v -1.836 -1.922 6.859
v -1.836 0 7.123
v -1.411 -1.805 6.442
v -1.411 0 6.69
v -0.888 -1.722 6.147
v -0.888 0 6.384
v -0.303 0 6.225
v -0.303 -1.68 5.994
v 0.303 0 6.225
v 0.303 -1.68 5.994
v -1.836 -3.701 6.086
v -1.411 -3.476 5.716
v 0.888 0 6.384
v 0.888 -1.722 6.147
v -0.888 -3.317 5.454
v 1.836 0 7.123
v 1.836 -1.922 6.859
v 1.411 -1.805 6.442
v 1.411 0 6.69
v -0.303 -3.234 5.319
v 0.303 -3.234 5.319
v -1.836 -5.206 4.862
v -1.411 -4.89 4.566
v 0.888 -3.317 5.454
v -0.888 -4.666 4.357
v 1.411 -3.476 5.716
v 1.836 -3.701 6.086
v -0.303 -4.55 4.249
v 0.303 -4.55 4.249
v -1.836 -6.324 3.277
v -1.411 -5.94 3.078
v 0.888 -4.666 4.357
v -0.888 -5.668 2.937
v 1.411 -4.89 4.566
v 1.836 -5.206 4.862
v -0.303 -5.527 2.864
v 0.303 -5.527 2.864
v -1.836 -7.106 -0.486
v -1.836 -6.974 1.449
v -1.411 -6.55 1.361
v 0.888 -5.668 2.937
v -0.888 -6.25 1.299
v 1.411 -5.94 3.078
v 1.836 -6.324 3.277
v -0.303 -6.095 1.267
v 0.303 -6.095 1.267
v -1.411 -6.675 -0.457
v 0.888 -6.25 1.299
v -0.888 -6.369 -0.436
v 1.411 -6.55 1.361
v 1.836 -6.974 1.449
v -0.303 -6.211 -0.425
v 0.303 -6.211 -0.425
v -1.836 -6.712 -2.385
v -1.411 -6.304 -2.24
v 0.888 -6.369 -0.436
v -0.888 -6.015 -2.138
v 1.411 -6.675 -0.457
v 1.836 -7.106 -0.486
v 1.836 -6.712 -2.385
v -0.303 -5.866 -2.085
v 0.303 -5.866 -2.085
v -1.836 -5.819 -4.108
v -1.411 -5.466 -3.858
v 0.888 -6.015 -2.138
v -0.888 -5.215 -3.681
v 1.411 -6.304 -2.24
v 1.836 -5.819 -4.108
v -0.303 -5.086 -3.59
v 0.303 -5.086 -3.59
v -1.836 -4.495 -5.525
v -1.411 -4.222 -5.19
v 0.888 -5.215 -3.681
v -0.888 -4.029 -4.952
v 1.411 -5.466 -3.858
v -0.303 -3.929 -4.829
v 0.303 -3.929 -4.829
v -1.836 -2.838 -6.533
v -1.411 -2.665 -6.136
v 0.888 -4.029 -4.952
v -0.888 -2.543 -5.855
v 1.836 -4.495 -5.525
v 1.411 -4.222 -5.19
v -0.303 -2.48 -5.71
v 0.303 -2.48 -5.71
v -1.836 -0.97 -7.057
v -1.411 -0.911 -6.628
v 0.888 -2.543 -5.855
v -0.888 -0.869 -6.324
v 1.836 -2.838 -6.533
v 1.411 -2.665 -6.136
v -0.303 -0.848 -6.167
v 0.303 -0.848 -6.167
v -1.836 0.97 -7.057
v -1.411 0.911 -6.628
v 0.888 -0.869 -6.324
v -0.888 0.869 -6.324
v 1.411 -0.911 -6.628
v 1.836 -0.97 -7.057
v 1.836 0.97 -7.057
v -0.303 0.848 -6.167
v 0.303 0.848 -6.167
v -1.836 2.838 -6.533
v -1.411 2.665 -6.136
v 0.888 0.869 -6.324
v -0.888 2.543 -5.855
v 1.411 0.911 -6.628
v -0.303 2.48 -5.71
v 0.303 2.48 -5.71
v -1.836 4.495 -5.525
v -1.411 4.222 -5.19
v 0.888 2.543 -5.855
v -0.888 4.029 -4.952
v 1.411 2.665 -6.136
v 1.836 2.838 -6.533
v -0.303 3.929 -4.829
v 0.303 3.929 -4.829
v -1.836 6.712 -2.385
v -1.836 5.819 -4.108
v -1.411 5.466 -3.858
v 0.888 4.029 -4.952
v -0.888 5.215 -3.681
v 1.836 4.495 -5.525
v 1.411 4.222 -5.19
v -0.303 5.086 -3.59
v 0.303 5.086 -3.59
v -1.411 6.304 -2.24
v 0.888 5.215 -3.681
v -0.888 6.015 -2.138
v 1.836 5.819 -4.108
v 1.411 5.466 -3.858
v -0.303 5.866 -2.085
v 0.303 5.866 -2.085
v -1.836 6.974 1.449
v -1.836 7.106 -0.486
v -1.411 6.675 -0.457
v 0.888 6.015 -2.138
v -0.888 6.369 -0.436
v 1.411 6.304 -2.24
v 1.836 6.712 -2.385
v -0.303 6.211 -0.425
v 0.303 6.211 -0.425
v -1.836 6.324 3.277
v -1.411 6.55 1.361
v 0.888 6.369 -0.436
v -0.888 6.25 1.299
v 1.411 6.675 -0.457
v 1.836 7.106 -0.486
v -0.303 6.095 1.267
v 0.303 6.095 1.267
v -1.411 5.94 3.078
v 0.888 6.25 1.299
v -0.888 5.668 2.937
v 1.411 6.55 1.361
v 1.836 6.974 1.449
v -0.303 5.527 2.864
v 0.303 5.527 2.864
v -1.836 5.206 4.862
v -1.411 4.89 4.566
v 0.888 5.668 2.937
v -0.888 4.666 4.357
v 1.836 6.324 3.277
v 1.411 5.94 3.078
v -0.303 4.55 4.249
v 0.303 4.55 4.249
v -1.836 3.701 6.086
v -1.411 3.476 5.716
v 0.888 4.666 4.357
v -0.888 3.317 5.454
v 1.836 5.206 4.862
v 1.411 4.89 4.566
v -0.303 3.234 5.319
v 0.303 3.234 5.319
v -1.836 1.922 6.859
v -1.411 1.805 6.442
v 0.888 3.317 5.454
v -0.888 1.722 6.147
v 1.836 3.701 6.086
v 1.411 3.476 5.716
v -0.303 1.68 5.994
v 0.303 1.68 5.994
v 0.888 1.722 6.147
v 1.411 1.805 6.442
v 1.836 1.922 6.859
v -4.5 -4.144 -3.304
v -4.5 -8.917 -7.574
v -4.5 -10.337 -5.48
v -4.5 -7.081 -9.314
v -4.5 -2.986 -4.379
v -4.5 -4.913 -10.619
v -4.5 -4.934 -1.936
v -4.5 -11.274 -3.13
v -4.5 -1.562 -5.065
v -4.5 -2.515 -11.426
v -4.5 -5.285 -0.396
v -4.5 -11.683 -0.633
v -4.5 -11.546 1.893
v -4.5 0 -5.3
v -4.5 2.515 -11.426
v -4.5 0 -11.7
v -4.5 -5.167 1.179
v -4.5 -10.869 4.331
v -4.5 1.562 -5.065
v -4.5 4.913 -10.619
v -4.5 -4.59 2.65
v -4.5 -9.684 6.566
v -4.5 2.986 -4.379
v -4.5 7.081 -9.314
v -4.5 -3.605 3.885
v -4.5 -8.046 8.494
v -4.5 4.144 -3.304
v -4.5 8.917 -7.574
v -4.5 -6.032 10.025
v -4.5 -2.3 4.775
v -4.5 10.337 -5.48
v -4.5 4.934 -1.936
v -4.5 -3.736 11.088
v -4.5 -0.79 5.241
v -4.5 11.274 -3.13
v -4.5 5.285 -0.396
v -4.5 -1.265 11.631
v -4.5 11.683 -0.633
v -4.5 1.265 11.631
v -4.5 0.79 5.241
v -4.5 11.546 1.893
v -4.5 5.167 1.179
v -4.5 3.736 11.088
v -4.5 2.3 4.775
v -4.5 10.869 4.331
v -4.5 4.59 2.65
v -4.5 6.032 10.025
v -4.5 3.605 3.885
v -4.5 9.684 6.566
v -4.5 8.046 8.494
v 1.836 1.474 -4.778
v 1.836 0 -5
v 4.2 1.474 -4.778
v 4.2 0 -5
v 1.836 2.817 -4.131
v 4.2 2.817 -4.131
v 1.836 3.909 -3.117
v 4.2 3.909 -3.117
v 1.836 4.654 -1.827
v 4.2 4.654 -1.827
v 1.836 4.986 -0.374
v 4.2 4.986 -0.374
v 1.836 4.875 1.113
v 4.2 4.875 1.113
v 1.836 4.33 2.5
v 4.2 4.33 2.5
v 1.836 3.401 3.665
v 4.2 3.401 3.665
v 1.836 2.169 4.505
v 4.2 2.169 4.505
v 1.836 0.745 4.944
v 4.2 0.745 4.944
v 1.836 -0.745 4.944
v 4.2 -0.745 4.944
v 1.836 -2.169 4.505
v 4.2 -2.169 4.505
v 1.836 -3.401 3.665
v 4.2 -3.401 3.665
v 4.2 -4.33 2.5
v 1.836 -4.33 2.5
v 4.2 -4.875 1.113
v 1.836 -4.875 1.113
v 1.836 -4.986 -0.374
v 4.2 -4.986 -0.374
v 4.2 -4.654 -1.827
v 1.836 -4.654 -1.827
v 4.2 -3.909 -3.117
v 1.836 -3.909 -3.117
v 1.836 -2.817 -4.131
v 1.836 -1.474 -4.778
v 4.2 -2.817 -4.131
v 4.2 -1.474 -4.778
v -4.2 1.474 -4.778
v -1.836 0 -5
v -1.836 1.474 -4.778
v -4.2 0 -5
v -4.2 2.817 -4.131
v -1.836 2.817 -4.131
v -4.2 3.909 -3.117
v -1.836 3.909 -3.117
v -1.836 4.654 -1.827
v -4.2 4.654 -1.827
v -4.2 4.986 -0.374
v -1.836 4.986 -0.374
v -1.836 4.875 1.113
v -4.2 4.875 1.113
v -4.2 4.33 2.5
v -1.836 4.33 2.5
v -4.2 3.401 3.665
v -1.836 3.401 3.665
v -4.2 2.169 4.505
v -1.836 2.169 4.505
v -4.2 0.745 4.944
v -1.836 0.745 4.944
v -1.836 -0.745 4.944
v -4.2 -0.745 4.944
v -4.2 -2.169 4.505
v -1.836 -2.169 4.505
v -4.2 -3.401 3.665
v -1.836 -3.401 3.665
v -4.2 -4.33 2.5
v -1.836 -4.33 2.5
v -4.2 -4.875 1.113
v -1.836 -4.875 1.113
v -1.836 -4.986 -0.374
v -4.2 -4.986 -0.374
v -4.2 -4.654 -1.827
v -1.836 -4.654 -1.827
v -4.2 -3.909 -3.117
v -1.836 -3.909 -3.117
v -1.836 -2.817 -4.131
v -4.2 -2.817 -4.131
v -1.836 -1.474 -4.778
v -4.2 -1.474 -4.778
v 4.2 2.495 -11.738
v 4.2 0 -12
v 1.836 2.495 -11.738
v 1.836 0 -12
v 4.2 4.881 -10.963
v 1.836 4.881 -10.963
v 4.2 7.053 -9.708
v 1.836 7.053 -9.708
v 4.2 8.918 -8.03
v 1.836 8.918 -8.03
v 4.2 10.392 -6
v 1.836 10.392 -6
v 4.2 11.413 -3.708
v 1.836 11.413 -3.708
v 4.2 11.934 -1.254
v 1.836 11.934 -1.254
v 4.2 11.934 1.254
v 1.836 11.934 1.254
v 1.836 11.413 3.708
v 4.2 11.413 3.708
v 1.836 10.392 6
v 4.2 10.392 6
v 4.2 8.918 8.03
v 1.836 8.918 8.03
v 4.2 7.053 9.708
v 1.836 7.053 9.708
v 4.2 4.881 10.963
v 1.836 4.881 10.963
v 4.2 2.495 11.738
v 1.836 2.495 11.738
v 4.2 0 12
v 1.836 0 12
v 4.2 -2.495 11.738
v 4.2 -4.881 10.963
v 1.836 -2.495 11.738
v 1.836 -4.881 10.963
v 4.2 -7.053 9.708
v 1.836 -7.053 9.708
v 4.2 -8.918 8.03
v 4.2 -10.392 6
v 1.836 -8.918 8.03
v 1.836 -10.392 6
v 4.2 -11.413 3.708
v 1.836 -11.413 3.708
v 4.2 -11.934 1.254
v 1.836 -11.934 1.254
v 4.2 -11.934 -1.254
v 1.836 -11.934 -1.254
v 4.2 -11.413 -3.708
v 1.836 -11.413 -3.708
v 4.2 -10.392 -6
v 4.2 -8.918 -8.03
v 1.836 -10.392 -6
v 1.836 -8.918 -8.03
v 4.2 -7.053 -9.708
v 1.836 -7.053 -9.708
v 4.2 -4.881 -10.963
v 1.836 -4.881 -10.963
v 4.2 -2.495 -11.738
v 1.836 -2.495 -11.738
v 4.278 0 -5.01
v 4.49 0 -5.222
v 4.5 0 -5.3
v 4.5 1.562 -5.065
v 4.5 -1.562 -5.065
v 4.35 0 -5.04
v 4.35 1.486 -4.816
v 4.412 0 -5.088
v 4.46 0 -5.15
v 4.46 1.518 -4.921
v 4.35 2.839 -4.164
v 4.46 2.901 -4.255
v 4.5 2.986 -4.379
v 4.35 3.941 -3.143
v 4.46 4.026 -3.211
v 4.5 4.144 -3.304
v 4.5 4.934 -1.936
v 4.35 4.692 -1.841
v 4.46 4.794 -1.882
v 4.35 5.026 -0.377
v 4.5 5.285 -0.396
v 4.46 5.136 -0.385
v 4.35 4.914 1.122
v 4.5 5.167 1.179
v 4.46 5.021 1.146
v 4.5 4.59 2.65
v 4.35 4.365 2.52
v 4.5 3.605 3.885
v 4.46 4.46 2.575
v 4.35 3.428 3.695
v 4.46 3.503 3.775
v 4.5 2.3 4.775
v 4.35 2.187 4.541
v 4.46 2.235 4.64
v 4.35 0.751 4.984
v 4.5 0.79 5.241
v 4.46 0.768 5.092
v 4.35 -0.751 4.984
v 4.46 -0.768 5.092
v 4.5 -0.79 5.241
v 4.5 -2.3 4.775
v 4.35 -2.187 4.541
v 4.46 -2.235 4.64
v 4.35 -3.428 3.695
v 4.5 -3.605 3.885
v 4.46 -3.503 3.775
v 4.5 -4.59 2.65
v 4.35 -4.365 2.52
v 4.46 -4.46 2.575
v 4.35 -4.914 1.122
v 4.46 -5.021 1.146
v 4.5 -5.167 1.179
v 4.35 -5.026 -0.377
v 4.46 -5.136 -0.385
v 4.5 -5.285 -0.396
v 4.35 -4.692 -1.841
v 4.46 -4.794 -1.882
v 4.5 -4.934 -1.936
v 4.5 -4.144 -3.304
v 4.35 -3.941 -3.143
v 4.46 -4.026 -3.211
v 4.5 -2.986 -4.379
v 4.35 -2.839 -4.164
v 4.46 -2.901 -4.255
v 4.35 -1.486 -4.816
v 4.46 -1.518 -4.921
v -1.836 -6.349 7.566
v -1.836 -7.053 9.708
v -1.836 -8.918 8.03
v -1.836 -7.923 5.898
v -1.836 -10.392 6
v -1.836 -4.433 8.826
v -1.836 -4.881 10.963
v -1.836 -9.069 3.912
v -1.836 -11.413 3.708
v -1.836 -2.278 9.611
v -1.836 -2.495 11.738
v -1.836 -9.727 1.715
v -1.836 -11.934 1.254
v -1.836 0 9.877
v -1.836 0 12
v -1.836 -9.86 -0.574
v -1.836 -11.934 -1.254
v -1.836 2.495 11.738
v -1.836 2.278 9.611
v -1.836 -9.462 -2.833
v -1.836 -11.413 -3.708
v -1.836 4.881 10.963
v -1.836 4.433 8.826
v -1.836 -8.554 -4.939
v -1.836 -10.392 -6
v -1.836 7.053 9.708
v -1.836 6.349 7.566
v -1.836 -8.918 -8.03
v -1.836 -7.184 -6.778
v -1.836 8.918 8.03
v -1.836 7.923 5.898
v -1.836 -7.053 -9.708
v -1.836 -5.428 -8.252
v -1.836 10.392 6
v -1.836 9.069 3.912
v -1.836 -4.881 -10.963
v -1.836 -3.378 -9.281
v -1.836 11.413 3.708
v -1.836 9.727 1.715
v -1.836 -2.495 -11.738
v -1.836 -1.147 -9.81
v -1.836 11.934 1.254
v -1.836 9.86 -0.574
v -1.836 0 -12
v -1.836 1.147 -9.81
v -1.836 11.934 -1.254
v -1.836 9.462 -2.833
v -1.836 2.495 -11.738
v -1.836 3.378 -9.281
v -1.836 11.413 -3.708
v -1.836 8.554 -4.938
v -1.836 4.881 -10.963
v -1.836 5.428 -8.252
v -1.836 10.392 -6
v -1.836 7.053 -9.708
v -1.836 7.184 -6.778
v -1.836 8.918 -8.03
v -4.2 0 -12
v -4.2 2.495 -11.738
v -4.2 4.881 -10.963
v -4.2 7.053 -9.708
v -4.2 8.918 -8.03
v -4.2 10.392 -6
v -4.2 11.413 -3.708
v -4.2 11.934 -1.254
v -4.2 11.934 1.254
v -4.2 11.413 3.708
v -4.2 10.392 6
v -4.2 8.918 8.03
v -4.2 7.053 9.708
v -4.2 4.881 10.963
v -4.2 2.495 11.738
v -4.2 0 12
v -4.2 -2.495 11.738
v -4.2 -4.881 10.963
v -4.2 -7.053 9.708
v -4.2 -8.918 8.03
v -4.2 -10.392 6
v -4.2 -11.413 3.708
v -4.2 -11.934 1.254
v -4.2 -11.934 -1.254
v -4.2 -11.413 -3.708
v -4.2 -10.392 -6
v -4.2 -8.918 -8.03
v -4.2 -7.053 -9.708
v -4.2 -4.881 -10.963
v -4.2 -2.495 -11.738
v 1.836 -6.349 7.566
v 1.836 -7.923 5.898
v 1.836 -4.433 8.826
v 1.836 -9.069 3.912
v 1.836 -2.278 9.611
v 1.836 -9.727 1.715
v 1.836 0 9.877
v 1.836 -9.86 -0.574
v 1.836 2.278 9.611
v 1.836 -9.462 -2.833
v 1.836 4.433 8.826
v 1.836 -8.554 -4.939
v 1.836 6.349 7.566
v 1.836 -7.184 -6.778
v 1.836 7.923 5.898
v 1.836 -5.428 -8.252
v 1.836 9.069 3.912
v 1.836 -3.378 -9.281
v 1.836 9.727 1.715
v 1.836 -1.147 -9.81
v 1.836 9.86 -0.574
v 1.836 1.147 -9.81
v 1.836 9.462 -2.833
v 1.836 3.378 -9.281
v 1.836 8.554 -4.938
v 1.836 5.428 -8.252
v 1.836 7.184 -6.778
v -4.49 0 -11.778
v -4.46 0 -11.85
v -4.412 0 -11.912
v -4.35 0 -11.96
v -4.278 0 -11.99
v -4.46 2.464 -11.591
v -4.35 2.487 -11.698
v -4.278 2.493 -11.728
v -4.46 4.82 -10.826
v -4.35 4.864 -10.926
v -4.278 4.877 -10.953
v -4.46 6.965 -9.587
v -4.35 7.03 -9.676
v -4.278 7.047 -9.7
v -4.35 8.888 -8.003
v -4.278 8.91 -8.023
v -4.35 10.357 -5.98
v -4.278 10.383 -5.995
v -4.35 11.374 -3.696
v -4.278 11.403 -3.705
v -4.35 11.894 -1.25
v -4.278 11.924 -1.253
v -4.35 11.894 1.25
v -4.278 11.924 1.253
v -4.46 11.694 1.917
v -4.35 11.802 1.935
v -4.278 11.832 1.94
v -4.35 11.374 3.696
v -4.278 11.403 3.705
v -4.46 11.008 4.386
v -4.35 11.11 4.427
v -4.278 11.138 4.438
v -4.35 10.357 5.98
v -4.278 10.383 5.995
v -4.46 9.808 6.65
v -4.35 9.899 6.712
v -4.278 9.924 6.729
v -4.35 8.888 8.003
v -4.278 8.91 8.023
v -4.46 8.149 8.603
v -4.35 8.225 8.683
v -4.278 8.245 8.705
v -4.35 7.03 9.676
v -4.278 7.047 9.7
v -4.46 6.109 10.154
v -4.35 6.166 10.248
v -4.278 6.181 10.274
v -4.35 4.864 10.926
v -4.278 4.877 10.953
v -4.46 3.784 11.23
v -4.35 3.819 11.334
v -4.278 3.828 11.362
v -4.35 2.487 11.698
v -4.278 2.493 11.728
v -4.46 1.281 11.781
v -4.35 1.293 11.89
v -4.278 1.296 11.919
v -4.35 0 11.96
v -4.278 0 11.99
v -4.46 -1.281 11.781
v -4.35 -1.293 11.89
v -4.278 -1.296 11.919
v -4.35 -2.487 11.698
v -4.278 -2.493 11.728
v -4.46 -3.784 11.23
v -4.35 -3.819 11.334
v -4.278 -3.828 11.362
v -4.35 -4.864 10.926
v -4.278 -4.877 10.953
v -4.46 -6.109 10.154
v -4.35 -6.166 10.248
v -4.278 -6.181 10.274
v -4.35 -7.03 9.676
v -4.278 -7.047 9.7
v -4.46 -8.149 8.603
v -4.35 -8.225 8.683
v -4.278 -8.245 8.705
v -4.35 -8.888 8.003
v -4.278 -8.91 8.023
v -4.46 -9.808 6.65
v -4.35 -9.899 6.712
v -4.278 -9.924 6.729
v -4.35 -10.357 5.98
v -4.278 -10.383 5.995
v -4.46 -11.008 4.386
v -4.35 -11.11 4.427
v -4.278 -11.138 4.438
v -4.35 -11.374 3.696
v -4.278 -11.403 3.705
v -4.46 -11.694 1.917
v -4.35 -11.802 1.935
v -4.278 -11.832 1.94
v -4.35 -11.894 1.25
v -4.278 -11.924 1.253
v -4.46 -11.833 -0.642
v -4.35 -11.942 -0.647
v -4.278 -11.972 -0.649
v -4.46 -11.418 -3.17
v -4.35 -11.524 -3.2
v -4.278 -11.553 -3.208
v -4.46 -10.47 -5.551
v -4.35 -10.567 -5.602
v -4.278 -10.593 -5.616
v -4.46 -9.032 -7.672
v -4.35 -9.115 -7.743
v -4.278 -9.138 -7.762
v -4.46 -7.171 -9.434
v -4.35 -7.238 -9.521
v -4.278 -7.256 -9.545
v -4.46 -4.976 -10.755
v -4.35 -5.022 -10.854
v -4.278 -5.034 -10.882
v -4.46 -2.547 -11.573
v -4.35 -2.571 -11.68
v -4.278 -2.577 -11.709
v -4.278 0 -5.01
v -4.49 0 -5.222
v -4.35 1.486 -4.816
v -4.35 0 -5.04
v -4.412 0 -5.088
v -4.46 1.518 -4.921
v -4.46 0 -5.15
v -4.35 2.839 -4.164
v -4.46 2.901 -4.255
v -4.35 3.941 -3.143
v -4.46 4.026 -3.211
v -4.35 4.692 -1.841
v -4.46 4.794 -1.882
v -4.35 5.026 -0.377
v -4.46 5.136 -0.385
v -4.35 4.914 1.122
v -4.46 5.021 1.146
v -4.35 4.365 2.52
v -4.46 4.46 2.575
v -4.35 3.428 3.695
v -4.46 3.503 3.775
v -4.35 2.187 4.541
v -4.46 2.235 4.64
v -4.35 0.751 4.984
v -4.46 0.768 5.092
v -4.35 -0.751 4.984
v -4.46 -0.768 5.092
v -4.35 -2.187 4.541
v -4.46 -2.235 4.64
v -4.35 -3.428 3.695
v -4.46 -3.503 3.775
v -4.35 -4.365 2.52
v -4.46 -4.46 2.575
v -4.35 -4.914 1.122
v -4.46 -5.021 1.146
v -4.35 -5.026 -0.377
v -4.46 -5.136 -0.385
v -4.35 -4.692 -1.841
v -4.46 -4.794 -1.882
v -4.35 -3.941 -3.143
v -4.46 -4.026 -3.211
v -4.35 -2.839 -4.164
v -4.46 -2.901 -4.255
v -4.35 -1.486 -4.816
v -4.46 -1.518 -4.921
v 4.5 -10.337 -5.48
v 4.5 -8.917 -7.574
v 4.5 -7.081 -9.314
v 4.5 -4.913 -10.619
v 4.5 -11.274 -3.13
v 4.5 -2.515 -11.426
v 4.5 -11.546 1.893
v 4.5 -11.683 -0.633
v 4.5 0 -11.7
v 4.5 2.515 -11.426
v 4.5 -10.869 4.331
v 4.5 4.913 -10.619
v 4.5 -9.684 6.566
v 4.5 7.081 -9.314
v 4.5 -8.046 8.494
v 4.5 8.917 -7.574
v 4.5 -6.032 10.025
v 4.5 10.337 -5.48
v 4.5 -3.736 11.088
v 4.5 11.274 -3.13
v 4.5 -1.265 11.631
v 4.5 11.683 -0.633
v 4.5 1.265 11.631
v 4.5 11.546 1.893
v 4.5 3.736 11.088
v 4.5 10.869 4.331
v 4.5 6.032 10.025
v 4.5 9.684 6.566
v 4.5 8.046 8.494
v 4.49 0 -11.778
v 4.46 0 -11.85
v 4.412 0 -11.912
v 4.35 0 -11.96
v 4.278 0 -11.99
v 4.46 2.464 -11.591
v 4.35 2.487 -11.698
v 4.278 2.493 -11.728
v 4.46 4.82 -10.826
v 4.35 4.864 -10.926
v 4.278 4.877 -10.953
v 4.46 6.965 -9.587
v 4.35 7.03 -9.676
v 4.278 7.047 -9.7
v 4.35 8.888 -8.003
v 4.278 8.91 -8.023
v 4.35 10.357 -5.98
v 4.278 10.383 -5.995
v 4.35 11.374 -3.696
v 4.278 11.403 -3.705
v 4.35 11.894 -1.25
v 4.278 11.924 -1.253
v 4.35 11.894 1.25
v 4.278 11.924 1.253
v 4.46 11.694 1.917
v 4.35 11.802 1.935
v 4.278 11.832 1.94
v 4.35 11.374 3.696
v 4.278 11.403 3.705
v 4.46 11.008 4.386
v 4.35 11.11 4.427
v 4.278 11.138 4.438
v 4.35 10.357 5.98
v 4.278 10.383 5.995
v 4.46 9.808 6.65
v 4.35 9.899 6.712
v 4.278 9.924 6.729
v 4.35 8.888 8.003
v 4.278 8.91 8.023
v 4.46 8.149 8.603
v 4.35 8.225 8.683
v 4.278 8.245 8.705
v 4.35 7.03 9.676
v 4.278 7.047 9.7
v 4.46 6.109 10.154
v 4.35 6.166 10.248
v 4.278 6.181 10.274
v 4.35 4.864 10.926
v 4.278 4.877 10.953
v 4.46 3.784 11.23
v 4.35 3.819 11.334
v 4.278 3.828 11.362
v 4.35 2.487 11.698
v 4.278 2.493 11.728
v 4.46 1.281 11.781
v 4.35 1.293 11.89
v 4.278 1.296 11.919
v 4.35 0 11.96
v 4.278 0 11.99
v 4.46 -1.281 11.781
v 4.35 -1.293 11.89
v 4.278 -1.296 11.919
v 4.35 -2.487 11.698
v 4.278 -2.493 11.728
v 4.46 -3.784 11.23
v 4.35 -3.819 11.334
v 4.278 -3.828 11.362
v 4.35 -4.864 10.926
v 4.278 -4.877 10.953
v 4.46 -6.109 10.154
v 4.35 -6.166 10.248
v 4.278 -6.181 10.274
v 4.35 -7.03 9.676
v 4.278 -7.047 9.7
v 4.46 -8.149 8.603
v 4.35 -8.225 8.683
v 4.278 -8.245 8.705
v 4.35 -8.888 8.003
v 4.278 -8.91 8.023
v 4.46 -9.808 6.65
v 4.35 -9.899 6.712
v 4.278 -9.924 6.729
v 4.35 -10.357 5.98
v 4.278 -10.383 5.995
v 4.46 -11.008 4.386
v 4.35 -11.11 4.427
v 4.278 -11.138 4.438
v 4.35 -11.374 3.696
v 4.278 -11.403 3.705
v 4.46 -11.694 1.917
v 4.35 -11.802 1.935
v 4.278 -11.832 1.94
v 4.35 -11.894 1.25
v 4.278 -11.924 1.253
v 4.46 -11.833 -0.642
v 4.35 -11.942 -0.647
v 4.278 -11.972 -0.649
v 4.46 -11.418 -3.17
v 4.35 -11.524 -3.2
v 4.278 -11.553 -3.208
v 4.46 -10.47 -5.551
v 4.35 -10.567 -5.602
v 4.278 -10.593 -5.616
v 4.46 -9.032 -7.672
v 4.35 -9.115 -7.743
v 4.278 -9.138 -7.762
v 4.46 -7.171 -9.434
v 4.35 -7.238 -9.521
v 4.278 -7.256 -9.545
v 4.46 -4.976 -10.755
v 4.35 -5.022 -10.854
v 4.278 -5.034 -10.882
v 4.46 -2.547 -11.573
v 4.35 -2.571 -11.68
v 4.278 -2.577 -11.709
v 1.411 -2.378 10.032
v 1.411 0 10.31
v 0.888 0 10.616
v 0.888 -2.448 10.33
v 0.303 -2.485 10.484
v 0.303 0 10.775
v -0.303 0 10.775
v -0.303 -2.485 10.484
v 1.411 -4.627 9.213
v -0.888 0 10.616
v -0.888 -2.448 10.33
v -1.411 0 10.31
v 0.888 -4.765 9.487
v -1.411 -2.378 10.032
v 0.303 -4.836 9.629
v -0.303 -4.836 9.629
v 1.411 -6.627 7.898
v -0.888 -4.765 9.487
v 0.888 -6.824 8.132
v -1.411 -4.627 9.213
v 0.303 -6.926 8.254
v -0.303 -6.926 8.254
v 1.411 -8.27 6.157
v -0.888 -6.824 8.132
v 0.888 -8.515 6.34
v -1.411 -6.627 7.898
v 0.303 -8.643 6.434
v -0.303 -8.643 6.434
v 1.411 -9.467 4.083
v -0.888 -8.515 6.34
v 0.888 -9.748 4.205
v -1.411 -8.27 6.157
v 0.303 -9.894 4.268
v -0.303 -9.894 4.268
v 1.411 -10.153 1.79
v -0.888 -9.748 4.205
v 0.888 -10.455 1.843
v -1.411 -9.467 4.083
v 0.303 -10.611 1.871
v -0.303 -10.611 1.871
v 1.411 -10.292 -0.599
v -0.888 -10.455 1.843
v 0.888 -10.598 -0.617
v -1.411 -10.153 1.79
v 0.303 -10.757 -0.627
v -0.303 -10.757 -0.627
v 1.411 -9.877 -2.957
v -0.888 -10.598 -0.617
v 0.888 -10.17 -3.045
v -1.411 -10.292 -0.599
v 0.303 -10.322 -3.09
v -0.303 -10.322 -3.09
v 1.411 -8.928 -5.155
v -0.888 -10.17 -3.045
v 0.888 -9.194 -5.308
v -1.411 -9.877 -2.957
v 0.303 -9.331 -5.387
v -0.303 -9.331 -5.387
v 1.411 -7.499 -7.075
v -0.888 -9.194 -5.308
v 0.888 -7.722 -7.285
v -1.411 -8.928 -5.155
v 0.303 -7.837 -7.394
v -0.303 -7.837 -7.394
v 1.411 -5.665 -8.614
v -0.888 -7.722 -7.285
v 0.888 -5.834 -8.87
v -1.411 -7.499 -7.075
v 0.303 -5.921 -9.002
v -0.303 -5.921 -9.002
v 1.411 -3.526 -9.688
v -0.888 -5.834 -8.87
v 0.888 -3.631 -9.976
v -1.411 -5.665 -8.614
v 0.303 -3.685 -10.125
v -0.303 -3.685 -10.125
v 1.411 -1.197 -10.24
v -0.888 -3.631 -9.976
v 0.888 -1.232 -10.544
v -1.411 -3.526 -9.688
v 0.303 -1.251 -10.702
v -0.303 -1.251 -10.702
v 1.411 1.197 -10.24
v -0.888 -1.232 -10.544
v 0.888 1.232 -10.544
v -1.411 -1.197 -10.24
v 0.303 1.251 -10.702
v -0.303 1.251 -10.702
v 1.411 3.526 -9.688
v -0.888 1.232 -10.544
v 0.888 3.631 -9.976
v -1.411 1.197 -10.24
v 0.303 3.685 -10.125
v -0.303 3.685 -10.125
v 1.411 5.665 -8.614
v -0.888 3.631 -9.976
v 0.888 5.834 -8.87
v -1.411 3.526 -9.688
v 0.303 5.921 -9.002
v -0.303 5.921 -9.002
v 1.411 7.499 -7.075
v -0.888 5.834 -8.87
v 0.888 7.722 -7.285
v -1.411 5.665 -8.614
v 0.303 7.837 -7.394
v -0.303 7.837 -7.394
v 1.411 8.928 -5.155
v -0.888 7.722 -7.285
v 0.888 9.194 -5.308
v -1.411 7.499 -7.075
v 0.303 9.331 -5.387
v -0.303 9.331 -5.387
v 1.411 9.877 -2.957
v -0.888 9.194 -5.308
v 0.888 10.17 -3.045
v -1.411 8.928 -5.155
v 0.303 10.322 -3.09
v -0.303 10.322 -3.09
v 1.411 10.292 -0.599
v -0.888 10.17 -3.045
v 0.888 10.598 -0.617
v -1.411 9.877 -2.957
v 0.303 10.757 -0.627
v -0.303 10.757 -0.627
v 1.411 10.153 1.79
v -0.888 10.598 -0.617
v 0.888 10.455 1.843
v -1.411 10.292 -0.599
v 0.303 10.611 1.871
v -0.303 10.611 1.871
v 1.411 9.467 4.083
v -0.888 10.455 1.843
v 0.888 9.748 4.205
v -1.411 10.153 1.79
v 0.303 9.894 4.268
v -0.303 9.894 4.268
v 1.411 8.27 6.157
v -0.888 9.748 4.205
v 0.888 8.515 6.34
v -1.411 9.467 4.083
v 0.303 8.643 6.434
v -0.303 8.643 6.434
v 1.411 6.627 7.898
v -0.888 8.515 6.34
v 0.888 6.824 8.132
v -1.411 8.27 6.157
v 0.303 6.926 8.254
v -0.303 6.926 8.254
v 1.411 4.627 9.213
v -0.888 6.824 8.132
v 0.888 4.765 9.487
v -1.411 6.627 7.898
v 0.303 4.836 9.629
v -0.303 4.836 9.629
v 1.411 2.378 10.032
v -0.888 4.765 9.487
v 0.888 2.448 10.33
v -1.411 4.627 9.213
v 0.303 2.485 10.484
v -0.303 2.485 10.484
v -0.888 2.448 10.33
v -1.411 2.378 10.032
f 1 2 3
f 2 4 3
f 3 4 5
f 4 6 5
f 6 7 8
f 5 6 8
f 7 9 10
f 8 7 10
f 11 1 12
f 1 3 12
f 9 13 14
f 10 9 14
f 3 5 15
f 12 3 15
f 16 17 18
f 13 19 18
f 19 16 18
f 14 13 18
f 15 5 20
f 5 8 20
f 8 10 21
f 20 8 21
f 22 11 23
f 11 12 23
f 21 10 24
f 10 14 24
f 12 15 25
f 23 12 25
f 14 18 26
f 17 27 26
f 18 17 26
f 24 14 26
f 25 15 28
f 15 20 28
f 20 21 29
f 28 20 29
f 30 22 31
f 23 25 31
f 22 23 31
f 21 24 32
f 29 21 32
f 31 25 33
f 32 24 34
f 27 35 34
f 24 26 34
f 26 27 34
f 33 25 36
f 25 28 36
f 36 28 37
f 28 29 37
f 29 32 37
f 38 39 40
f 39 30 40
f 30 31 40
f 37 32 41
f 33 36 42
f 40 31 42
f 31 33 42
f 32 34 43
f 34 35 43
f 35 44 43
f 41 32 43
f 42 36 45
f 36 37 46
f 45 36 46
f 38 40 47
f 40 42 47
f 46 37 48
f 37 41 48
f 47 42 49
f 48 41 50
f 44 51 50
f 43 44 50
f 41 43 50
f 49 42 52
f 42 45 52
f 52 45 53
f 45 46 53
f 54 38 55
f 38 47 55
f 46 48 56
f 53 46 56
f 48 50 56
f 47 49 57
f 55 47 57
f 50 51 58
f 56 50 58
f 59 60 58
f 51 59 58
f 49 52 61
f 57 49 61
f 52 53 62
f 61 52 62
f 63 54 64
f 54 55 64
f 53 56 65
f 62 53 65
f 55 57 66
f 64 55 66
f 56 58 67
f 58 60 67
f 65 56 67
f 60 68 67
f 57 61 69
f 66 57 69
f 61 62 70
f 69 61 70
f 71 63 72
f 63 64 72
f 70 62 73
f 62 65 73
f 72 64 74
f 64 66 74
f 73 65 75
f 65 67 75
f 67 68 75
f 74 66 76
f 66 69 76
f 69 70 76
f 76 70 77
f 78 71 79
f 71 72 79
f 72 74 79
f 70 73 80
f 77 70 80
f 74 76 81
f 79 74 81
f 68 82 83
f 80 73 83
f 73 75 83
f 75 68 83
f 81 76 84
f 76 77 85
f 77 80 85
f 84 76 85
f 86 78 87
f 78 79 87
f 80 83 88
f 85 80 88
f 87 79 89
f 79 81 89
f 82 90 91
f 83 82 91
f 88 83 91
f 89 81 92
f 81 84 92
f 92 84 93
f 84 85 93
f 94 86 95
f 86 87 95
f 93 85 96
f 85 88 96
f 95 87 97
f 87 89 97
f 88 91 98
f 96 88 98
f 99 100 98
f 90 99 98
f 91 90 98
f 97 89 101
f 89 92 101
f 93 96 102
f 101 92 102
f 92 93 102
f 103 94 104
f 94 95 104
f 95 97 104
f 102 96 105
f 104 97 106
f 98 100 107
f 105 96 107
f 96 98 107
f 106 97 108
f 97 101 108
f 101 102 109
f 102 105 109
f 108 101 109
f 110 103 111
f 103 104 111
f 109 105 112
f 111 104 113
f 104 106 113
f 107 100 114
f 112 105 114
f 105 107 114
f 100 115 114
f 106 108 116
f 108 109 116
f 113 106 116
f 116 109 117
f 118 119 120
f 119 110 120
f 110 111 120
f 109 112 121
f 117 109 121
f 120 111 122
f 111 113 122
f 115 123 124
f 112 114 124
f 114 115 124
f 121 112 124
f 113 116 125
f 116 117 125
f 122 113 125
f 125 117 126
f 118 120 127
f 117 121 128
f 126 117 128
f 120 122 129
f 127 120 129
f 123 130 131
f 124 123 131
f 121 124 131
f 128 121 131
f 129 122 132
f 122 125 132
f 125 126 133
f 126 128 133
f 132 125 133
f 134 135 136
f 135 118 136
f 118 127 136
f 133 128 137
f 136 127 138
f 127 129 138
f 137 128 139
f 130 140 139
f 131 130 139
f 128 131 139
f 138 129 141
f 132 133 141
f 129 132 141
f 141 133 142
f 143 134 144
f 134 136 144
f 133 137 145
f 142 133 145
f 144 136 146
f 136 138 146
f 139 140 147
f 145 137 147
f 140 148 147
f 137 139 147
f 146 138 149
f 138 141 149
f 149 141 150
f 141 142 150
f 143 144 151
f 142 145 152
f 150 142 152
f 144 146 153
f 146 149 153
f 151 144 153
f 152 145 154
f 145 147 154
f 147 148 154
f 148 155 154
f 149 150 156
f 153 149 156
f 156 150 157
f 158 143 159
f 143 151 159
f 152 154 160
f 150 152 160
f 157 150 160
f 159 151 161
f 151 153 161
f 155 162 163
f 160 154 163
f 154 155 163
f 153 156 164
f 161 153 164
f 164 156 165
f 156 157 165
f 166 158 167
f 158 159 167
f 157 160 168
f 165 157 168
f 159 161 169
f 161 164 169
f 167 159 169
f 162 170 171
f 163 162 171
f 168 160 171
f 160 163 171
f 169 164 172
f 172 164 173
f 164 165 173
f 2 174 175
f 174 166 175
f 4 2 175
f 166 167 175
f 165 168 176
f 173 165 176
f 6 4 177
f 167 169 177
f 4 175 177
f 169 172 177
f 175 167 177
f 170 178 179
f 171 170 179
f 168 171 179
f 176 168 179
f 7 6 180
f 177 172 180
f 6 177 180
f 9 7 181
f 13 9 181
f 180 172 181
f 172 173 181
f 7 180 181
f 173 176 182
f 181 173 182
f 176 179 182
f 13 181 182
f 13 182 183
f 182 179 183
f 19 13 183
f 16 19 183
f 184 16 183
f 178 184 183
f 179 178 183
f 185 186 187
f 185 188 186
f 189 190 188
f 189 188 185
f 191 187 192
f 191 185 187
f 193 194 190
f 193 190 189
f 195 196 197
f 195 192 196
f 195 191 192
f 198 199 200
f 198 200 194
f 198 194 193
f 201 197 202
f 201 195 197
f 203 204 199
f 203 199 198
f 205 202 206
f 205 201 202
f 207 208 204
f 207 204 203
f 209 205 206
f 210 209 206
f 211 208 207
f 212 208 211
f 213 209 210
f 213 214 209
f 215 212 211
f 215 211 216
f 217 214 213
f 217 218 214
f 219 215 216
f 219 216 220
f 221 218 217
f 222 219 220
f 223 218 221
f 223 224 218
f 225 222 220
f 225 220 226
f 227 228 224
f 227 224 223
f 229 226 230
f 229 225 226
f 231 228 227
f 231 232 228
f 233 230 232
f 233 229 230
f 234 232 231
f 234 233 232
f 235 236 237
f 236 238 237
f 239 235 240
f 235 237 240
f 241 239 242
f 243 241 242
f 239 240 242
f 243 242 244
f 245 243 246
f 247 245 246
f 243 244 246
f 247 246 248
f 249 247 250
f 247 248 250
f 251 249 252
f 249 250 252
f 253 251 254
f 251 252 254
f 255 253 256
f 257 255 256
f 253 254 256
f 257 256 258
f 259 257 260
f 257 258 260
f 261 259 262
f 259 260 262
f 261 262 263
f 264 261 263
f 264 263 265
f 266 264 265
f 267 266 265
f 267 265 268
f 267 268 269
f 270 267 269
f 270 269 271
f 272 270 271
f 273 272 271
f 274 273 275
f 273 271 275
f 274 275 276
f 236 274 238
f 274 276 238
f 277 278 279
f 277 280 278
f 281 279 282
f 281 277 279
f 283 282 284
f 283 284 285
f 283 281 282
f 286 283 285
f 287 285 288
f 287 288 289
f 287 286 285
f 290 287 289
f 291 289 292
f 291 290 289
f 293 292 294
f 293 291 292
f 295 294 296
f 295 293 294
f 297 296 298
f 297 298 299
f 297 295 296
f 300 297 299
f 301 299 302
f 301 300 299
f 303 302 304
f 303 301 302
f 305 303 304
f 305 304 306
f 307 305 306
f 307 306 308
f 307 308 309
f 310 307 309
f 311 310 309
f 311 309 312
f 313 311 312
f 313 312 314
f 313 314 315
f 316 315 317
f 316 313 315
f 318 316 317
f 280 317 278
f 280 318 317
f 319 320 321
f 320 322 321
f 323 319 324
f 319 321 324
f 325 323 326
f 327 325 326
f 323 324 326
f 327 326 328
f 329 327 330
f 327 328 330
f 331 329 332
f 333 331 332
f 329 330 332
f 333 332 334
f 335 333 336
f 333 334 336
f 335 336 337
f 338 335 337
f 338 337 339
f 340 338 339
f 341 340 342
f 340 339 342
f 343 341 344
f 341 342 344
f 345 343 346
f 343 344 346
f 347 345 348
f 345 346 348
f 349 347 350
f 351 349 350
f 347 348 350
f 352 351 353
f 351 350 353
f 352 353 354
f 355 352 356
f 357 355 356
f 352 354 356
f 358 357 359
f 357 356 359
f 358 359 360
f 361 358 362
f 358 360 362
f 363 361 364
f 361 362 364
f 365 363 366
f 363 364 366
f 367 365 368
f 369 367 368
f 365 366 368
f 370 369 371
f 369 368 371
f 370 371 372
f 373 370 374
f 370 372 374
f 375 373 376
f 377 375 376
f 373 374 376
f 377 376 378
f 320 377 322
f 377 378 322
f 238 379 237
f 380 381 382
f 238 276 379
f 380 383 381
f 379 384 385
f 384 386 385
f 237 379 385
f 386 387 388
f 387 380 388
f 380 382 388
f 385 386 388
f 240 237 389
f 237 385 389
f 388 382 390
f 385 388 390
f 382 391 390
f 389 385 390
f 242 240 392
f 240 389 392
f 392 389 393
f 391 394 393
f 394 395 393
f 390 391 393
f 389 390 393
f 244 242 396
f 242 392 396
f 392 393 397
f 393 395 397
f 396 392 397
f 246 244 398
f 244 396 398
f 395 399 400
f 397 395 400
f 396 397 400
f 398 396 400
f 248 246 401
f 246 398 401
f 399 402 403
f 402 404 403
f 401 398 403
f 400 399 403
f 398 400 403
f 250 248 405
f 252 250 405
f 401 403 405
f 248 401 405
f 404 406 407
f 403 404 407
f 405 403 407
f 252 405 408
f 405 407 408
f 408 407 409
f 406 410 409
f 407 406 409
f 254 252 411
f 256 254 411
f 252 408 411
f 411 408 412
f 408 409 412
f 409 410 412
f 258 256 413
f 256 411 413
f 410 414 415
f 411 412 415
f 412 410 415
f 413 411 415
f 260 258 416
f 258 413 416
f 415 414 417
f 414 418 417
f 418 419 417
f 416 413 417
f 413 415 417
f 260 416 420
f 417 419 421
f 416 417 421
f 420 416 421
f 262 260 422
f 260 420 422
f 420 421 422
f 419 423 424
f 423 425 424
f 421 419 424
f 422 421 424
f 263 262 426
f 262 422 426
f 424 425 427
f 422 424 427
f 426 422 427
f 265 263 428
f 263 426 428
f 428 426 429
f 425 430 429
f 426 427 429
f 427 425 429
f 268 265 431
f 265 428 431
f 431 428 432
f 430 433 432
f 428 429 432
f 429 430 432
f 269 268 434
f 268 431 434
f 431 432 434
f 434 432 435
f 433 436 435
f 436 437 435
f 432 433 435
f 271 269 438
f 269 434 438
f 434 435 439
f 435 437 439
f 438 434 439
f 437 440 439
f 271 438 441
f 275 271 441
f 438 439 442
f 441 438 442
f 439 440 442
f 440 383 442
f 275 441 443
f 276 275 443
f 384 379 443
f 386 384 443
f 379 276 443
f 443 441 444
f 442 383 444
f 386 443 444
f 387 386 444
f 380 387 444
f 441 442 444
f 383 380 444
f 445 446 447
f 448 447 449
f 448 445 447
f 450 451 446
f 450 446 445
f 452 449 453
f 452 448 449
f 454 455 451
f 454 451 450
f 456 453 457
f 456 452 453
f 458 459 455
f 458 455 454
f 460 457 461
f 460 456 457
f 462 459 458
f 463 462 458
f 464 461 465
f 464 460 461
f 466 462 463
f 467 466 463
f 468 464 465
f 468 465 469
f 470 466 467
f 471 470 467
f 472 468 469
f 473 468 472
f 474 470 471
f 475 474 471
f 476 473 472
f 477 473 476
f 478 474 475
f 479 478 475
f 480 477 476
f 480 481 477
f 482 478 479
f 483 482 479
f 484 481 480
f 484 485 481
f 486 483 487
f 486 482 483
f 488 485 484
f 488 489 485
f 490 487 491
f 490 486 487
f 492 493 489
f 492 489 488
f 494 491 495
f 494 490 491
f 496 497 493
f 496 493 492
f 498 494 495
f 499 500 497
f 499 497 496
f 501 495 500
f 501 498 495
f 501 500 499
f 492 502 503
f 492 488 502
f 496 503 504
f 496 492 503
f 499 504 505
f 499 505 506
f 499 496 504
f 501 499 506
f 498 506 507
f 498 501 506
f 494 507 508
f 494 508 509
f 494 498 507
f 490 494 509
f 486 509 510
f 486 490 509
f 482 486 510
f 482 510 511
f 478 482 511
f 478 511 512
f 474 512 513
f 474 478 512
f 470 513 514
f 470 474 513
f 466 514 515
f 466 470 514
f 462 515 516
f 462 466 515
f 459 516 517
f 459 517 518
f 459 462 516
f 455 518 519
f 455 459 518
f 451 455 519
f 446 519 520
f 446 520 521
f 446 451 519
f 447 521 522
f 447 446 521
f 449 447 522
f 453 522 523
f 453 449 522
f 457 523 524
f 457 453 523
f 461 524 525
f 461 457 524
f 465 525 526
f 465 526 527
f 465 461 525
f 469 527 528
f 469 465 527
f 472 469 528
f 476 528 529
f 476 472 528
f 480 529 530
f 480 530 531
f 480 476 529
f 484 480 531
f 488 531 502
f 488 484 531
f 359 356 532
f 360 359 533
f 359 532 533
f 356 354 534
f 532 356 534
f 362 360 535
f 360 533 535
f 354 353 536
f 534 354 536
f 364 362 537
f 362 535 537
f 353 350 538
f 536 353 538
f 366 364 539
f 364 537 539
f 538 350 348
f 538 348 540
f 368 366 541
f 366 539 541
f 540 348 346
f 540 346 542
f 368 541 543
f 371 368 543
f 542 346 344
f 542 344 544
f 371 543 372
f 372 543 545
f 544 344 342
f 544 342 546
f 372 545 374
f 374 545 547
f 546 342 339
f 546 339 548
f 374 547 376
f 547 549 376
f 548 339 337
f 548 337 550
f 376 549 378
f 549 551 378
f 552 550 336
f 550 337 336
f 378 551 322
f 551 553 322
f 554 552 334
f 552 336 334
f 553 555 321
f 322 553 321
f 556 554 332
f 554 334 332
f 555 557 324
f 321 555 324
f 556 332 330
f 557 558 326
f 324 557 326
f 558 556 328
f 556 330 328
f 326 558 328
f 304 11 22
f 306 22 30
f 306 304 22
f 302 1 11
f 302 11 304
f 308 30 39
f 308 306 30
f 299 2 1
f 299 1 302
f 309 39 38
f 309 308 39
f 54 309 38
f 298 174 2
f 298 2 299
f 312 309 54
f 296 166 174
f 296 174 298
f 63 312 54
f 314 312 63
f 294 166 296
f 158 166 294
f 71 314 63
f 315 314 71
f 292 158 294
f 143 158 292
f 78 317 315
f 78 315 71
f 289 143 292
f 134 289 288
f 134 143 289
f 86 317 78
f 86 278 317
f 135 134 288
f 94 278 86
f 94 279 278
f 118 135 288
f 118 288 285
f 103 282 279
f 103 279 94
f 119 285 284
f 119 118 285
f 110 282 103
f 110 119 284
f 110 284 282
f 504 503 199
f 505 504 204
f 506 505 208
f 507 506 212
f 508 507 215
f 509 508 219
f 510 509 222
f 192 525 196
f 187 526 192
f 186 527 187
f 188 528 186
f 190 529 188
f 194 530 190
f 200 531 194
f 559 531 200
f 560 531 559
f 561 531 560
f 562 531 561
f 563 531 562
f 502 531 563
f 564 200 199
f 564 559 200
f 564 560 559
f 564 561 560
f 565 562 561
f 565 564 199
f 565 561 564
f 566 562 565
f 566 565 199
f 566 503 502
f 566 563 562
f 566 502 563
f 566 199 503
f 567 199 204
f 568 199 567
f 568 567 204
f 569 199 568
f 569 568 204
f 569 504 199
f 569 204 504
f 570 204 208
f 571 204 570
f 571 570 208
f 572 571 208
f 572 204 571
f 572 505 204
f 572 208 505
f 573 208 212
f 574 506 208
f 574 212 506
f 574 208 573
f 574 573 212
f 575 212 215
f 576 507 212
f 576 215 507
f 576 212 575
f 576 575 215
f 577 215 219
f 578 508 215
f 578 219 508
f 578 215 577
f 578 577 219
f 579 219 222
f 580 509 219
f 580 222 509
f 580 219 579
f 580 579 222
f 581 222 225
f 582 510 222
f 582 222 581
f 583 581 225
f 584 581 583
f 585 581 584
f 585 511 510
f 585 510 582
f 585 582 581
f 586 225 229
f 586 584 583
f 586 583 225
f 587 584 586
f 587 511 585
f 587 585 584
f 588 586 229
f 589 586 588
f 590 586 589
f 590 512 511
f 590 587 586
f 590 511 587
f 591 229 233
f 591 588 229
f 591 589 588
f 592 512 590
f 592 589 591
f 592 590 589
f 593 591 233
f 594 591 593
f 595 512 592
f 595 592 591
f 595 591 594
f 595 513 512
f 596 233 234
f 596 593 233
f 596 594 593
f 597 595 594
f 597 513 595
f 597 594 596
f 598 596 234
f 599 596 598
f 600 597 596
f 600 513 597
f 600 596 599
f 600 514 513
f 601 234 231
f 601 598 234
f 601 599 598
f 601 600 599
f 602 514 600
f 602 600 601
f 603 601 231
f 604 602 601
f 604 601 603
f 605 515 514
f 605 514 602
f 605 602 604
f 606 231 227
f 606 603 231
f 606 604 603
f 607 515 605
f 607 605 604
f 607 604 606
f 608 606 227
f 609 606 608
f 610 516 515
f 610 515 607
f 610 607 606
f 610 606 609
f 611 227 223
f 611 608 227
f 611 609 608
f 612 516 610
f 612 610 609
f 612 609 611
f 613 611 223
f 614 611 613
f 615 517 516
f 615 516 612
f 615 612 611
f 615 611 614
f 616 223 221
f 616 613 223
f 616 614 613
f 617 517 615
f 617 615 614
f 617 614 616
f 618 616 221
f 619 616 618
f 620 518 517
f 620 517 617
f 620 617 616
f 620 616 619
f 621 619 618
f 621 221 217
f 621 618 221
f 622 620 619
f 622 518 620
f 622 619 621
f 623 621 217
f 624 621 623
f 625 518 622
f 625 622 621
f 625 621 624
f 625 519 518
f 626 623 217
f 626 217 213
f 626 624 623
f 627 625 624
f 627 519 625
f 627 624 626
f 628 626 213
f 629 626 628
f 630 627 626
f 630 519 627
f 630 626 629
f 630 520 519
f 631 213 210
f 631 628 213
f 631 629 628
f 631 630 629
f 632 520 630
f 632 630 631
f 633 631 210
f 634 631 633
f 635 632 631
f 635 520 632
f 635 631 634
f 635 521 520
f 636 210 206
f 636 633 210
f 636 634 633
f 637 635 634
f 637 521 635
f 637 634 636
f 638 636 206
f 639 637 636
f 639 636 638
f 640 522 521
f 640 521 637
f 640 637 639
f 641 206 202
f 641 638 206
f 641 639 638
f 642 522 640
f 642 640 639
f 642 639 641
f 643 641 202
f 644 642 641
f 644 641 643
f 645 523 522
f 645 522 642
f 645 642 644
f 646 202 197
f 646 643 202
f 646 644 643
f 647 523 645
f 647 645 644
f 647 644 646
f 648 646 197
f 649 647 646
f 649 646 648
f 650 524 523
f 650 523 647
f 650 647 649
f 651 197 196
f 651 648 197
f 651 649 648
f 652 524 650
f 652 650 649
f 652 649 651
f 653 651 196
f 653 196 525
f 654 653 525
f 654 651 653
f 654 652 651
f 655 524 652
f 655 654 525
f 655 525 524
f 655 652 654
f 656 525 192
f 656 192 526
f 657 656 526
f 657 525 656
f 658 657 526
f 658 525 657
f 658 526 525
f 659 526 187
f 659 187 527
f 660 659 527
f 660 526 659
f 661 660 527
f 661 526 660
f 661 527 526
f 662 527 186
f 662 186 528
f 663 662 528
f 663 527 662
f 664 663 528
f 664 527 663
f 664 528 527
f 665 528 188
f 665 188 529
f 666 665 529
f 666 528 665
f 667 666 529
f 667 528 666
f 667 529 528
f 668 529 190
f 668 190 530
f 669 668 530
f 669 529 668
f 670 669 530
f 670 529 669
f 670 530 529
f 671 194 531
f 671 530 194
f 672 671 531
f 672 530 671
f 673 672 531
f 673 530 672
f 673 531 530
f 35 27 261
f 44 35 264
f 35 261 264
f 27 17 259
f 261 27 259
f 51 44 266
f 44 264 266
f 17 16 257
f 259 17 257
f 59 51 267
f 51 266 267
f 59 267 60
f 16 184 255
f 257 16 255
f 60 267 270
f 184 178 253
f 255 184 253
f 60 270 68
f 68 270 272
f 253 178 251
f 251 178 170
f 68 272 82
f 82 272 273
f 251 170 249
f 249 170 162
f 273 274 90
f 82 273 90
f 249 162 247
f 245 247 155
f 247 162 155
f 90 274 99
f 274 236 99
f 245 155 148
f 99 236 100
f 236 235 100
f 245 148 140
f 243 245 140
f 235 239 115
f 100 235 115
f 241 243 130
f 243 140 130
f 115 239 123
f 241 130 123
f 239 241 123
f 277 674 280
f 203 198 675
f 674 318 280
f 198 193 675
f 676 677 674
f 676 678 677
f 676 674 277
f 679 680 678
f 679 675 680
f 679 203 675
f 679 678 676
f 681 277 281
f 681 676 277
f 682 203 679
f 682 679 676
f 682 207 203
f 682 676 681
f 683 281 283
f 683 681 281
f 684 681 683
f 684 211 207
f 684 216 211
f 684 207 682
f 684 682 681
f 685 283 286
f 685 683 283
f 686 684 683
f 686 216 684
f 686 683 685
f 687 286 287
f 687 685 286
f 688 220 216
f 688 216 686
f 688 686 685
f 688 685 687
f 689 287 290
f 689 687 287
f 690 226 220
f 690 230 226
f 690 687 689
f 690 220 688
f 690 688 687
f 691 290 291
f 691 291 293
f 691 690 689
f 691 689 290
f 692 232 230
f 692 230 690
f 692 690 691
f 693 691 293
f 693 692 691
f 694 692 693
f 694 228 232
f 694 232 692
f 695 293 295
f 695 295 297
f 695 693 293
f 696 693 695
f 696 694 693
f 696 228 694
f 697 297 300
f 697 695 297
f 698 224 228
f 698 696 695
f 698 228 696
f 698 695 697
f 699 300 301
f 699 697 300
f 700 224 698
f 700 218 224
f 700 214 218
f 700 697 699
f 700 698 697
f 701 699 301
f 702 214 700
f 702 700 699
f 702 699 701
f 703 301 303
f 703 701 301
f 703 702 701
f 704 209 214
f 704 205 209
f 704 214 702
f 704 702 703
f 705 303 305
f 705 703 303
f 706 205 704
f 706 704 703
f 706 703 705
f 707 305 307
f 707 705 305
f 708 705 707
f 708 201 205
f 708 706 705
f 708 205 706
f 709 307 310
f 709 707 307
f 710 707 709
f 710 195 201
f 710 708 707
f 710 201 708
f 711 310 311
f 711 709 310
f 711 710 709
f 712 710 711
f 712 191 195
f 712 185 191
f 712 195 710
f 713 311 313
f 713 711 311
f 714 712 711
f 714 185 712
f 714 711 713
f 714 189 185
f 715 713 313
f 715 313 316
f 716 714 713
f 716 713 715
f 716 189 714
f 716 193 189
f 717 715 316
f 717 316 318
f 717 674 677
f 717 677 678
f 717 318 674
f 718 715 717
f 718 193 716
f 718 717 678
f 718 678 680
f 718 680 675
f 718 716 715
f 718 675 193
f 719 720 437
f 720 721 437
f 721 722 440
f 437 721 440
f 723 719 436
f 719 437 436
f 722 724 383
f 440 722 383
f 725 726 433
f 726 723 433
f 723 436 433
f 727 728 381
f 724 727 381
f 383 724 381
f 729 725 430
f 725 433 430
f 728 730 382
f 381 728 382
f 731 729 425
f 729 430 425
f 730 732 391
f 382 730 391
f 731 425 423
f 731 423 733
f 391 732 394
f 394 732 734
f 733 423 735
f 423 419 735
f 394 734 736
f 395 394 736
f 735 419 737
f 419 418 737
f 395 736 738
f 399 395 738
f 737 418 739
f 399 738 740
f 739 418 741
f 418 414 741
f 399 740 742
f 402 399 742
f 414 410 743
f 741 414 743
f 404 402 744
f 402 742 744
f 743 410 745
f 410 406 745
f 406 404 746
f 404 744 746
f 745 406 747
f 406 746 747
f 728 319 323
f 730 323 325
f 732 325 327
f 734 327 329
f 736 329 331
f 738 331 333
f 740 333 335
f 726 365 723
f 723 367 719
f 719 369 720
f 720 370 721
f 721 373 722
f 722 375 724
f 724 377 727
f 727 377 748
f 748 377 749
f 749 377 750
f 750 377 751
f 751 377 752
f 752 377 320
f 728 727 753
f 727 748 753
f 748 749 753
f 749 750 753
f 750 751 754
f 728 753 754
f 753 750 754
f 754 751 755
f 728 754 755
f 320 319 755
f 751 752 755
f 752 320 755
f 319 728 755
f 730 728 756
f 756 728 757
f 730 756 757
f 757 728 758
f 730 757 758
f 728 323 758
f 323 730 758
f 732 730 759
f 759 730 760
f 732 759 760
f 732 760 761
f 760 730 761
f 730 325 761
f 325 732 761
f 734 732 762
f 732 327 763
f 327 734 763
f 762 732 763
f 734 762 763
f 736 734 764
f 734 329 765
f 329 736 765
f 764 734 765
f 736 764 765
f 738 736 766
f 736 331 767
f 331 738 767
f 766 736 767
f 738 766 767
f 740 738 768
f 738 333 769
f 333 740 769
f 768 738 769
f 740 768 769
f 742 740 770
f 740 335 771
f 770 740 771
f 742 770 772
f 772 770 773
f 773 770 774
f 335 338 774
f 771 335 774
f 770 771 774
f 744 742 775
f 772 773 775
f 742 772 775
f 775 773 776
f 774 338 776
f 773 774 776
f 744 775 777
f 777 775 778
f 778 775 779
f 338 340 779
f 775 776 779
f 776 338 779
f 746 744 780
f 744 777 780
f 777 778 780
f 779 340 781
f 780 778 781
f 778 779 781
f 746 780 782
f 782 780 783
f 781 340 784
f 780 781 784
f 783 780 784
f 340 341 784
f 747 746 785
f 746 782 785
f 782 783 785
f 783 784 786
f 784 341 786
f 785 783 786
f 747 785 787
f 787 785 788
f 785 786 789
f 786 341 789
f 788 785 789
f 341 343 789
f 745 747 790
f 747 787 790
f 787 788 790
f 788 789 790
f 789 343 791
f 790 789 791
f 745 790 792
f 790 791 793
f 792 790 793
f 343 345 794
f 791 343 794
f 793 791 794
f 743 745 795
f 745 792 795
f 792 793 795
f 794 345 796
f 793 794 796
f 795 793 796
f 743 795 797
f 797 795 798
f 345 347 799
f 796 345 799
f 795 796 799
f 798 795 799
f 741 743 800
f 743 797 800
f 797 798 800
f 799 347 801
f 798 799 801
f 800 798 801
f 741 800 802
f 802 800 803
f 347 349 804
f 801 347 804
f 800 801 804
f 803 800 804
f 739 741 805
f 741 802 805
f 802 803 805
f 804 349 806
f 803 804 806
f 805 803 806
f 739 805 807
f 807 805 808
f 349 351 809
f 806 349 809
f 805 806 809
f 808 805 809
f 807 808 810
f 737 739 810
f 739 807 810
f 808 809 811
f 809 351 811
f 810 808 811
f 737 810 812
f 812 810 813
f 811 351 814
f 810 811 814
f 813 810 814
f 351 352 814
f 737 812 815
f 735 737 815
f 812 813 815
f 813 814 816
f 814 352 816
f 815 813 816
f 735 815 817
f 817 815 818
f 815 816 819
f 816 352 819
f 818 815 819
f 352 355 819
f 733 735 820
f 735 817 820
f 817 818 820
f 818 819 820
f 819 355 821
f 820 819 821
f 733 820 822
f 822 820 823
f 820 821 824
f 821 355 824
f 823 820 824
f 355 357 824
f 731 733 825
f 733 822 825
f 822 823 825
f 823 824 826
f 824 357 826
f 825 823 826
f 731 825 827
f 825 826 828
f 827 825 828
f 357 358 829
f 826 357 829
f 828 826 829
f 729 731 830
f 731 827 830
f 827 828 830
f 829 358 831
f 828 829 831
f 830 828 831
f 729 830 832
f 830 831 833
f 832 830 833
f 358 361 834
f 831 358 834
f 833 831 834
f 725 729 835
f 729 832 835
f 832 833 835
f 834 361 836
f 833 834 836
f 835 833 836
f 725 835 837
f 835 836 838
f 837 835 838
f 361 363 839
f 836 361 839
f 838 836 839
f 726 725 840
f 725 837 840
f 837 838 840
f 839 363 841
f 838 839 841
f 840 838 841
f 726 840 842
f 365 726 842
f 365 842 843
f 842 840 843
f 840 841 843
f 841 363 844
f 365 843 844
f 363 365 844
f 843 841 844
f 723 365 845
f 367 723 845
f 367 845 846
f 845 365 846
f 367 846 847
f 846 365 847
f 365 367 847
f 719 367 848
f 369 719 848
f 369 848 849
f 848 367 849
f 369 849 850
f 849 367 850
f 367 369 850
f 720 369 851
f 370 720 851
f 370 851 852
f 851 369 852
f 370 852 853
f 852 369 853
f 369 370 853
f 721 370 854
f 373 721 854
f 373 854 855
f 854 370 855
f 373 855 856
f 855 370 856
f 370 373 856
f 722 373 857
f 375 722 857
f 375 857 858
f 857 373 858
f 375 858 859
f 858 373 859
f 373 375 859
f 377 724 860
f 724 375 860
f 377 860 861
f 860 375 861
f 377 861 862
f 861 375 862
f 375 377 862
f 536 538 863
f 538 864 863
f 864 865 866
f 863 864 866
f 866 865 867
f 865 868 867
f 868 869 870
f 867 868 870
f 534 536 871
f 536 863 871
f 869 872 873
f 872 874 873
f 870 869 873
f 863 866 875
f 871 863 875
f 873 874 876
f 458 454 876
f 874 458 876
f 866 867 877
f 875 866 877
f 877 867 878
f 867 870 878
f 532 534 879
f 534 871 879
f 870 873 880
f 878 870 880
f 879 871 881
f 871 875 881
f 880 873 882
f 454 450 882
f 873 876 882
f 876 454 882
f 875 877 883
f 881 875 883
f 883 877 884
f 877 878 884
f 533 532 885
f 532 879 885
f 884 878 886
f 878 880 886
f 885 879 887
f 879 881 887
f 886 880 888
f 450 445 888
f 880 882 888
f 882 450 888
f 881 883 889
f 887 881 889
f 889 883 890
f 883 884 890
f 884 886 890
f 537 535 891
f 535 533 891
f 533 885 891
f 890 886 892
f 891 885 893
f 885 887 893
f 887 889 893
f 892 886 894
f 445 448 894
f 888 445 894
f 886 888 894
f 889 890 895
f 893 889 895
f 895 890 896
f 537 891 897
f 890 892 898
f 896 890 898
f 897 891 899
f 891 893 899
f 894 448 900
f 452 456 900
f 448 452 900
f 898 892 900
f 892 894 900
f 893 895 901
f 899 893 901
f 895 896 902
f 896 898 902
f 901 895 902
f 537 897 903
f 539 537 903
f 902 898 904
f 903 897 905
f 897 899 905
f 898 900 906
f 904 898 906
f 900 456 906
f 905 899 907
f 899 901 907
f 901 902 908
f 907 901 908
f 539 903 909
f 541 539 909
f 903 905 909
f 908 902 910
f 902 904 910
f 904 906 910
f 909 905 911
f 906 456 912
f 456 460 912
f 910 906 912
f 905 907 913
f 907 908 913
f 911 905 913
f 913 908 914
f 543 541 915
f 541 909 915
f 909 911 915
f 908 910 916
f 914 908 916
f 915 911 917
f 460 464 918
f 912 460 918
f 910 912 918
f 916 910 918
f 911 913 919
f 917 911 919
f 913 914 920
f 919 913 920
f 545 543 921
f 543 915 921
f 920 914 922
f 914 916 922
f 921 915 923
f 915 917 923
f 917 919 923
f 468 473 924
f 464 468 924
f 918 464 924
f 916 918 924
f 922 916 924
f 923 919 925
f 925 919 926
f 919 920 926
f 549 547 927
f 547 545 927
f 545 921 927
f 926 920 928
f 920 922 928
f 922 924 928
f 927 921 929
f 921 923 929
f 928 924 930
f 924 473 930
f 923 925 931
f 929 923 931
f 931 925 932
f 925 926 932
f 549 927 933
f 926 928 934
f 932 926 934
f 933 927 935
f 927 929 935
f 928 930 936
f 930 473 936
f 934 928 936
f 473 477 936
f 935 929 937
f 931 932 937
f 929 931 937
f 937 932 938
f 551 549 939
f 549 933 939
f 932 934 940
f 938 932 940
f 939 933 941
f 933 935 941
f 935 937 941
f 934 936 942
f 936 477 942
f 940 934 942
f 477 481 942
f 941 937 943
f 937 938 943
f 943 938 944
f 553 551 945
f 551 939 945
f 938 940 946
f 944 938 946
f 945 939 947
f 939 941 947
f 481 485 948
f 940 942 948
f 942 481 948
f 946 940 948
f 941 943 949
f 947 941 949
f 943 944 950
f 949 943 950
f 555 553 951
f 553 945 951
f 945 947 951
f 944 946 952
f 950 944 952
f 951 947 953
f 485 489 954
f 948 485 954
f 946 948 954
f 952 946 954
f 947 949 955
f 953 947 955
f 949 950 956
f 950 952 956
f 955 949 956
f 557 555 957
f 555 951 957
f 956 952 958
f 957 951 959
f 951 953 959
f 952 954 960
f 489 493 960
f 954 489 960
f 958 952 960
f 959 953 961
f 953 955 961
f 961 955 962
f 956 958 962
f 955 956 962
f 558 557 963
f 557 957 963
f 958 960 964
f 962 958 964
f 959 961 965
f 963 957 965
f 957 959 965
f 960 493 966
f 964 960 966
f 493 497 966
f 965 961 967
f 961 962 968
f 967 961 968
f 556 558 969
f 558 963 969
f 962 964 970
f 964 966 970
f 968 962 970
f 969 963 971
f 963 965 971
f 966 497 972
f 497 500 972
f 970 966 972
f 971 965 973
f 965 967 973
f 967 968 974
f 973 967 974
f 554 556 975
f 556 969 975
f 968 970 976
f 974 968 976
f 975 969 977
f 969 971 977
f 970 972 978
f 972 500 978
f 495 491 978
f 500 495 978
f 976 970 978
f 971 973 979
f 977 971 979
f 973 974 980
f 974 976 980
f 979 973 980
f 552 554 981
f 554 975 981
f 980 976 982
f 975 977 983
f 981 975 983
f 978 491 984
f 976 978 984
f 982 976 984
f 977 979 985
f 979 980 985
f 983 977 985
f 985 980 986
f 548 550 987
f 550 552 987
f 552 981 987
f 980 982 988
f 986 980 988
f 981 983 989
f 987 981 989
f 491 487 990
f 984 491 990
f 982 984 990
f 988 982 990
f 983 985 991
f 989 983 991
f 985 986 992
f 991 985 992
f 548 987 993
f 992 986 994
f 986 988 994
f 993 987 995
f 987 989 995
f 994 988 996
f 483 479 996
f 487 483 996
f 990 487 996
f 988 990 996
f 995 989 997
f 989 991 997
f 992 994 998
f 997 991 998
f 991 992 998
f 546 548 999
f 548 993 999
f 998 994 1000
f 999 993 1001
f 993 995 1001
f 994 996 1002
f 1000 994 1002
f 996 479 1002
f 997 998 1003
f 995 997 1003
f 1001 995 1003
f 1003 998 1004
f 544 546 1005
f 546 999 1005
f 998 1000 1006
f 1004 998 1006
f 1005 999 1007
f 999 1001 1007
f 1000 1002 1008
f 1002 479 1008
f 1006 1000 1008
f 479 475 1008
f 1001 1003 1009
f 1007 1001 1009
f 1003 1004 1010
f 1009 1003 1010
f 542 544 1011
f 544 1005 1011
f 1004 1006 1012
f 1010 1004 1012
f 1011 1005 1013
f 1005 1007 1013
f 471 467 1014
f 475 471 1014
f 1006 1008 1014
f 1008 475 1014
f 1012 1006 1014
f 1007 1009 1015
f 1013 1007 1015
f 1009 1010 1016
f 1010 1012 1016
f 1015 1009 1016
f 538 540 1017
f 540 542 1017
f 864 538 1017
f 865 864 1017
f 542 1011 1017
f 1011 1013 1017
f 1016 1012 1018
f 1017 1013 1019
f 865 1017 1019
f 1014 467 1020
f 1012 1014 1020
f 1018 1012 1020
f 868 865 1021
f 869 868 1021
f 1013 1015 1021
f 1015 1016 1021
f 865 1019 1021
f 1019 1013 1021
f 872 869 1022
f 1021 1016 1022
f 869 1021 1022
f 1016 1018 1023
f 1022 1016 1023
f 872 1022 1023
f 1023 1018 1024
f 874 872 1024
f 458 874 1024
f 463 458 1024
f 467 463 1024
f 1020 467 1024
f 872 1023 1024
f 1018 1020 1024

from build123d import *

# Parameters (mm, degrees)
BALSIMSKE_R = 2.295


with BuildPart() as part:
    # InnRacSke → Race (revolve)
    with BuildSketch(Plane.XY, mode=Mode.PRIVATE) as race_sk:
        with BuildLine():
            Line((-1.836, 7.165082774), (-1.836, 5))
            Line((-1.836, 5), (-4.2, 5))
            ThreePointArc((-4.2, 5), (-4.412132034, 5.087867966), (-4.5, 5.3))
            Line((-4.5, 5.3), (-4.5, 11.7))
            ThreePointArc((-4.5, 11.7), (-4.412132034, 11.912132034), (-4.2, 12))
            Line((-4.2, 12), (-1.836, 12))
            Line((-1.836, 12), (-1.836, 9.834917226))
            ThreePointArc((-1.836, 9.834917226), (-2.27, 8.5), (-1.836, 7.165082774))
        make_face()
    race = revolve(race_sk.sketch.rotate(Axis((-34.925, 0, 0), (1, 0, 0)), 270), axis=Axis((-34.925, 0, 0), (1, 0, 0)))

    # BalSimSke → BallsSimplified (revolve)
    with BuildSketch(Plane.XY, mode=Mode.PRIVATE) as ballssimplified_sk:
        with Locations((0, 8.5)):
            Circle(BALSIMSKE_R)
    revolve(ballssimplified_sk.sketch.rotate(Axis((-25.4, 0, 0), (1, 0, 0)), 90), axis=Axis((-25.4, 0, 0), (1, 0, 0)))

    # Mirror1: Race across plane
    add(race.mirror(Plane(origin=(0, 0, 0), x_dir=(0, 0, 1), z_dir=(1, 0, 0))))


solid = part.part
